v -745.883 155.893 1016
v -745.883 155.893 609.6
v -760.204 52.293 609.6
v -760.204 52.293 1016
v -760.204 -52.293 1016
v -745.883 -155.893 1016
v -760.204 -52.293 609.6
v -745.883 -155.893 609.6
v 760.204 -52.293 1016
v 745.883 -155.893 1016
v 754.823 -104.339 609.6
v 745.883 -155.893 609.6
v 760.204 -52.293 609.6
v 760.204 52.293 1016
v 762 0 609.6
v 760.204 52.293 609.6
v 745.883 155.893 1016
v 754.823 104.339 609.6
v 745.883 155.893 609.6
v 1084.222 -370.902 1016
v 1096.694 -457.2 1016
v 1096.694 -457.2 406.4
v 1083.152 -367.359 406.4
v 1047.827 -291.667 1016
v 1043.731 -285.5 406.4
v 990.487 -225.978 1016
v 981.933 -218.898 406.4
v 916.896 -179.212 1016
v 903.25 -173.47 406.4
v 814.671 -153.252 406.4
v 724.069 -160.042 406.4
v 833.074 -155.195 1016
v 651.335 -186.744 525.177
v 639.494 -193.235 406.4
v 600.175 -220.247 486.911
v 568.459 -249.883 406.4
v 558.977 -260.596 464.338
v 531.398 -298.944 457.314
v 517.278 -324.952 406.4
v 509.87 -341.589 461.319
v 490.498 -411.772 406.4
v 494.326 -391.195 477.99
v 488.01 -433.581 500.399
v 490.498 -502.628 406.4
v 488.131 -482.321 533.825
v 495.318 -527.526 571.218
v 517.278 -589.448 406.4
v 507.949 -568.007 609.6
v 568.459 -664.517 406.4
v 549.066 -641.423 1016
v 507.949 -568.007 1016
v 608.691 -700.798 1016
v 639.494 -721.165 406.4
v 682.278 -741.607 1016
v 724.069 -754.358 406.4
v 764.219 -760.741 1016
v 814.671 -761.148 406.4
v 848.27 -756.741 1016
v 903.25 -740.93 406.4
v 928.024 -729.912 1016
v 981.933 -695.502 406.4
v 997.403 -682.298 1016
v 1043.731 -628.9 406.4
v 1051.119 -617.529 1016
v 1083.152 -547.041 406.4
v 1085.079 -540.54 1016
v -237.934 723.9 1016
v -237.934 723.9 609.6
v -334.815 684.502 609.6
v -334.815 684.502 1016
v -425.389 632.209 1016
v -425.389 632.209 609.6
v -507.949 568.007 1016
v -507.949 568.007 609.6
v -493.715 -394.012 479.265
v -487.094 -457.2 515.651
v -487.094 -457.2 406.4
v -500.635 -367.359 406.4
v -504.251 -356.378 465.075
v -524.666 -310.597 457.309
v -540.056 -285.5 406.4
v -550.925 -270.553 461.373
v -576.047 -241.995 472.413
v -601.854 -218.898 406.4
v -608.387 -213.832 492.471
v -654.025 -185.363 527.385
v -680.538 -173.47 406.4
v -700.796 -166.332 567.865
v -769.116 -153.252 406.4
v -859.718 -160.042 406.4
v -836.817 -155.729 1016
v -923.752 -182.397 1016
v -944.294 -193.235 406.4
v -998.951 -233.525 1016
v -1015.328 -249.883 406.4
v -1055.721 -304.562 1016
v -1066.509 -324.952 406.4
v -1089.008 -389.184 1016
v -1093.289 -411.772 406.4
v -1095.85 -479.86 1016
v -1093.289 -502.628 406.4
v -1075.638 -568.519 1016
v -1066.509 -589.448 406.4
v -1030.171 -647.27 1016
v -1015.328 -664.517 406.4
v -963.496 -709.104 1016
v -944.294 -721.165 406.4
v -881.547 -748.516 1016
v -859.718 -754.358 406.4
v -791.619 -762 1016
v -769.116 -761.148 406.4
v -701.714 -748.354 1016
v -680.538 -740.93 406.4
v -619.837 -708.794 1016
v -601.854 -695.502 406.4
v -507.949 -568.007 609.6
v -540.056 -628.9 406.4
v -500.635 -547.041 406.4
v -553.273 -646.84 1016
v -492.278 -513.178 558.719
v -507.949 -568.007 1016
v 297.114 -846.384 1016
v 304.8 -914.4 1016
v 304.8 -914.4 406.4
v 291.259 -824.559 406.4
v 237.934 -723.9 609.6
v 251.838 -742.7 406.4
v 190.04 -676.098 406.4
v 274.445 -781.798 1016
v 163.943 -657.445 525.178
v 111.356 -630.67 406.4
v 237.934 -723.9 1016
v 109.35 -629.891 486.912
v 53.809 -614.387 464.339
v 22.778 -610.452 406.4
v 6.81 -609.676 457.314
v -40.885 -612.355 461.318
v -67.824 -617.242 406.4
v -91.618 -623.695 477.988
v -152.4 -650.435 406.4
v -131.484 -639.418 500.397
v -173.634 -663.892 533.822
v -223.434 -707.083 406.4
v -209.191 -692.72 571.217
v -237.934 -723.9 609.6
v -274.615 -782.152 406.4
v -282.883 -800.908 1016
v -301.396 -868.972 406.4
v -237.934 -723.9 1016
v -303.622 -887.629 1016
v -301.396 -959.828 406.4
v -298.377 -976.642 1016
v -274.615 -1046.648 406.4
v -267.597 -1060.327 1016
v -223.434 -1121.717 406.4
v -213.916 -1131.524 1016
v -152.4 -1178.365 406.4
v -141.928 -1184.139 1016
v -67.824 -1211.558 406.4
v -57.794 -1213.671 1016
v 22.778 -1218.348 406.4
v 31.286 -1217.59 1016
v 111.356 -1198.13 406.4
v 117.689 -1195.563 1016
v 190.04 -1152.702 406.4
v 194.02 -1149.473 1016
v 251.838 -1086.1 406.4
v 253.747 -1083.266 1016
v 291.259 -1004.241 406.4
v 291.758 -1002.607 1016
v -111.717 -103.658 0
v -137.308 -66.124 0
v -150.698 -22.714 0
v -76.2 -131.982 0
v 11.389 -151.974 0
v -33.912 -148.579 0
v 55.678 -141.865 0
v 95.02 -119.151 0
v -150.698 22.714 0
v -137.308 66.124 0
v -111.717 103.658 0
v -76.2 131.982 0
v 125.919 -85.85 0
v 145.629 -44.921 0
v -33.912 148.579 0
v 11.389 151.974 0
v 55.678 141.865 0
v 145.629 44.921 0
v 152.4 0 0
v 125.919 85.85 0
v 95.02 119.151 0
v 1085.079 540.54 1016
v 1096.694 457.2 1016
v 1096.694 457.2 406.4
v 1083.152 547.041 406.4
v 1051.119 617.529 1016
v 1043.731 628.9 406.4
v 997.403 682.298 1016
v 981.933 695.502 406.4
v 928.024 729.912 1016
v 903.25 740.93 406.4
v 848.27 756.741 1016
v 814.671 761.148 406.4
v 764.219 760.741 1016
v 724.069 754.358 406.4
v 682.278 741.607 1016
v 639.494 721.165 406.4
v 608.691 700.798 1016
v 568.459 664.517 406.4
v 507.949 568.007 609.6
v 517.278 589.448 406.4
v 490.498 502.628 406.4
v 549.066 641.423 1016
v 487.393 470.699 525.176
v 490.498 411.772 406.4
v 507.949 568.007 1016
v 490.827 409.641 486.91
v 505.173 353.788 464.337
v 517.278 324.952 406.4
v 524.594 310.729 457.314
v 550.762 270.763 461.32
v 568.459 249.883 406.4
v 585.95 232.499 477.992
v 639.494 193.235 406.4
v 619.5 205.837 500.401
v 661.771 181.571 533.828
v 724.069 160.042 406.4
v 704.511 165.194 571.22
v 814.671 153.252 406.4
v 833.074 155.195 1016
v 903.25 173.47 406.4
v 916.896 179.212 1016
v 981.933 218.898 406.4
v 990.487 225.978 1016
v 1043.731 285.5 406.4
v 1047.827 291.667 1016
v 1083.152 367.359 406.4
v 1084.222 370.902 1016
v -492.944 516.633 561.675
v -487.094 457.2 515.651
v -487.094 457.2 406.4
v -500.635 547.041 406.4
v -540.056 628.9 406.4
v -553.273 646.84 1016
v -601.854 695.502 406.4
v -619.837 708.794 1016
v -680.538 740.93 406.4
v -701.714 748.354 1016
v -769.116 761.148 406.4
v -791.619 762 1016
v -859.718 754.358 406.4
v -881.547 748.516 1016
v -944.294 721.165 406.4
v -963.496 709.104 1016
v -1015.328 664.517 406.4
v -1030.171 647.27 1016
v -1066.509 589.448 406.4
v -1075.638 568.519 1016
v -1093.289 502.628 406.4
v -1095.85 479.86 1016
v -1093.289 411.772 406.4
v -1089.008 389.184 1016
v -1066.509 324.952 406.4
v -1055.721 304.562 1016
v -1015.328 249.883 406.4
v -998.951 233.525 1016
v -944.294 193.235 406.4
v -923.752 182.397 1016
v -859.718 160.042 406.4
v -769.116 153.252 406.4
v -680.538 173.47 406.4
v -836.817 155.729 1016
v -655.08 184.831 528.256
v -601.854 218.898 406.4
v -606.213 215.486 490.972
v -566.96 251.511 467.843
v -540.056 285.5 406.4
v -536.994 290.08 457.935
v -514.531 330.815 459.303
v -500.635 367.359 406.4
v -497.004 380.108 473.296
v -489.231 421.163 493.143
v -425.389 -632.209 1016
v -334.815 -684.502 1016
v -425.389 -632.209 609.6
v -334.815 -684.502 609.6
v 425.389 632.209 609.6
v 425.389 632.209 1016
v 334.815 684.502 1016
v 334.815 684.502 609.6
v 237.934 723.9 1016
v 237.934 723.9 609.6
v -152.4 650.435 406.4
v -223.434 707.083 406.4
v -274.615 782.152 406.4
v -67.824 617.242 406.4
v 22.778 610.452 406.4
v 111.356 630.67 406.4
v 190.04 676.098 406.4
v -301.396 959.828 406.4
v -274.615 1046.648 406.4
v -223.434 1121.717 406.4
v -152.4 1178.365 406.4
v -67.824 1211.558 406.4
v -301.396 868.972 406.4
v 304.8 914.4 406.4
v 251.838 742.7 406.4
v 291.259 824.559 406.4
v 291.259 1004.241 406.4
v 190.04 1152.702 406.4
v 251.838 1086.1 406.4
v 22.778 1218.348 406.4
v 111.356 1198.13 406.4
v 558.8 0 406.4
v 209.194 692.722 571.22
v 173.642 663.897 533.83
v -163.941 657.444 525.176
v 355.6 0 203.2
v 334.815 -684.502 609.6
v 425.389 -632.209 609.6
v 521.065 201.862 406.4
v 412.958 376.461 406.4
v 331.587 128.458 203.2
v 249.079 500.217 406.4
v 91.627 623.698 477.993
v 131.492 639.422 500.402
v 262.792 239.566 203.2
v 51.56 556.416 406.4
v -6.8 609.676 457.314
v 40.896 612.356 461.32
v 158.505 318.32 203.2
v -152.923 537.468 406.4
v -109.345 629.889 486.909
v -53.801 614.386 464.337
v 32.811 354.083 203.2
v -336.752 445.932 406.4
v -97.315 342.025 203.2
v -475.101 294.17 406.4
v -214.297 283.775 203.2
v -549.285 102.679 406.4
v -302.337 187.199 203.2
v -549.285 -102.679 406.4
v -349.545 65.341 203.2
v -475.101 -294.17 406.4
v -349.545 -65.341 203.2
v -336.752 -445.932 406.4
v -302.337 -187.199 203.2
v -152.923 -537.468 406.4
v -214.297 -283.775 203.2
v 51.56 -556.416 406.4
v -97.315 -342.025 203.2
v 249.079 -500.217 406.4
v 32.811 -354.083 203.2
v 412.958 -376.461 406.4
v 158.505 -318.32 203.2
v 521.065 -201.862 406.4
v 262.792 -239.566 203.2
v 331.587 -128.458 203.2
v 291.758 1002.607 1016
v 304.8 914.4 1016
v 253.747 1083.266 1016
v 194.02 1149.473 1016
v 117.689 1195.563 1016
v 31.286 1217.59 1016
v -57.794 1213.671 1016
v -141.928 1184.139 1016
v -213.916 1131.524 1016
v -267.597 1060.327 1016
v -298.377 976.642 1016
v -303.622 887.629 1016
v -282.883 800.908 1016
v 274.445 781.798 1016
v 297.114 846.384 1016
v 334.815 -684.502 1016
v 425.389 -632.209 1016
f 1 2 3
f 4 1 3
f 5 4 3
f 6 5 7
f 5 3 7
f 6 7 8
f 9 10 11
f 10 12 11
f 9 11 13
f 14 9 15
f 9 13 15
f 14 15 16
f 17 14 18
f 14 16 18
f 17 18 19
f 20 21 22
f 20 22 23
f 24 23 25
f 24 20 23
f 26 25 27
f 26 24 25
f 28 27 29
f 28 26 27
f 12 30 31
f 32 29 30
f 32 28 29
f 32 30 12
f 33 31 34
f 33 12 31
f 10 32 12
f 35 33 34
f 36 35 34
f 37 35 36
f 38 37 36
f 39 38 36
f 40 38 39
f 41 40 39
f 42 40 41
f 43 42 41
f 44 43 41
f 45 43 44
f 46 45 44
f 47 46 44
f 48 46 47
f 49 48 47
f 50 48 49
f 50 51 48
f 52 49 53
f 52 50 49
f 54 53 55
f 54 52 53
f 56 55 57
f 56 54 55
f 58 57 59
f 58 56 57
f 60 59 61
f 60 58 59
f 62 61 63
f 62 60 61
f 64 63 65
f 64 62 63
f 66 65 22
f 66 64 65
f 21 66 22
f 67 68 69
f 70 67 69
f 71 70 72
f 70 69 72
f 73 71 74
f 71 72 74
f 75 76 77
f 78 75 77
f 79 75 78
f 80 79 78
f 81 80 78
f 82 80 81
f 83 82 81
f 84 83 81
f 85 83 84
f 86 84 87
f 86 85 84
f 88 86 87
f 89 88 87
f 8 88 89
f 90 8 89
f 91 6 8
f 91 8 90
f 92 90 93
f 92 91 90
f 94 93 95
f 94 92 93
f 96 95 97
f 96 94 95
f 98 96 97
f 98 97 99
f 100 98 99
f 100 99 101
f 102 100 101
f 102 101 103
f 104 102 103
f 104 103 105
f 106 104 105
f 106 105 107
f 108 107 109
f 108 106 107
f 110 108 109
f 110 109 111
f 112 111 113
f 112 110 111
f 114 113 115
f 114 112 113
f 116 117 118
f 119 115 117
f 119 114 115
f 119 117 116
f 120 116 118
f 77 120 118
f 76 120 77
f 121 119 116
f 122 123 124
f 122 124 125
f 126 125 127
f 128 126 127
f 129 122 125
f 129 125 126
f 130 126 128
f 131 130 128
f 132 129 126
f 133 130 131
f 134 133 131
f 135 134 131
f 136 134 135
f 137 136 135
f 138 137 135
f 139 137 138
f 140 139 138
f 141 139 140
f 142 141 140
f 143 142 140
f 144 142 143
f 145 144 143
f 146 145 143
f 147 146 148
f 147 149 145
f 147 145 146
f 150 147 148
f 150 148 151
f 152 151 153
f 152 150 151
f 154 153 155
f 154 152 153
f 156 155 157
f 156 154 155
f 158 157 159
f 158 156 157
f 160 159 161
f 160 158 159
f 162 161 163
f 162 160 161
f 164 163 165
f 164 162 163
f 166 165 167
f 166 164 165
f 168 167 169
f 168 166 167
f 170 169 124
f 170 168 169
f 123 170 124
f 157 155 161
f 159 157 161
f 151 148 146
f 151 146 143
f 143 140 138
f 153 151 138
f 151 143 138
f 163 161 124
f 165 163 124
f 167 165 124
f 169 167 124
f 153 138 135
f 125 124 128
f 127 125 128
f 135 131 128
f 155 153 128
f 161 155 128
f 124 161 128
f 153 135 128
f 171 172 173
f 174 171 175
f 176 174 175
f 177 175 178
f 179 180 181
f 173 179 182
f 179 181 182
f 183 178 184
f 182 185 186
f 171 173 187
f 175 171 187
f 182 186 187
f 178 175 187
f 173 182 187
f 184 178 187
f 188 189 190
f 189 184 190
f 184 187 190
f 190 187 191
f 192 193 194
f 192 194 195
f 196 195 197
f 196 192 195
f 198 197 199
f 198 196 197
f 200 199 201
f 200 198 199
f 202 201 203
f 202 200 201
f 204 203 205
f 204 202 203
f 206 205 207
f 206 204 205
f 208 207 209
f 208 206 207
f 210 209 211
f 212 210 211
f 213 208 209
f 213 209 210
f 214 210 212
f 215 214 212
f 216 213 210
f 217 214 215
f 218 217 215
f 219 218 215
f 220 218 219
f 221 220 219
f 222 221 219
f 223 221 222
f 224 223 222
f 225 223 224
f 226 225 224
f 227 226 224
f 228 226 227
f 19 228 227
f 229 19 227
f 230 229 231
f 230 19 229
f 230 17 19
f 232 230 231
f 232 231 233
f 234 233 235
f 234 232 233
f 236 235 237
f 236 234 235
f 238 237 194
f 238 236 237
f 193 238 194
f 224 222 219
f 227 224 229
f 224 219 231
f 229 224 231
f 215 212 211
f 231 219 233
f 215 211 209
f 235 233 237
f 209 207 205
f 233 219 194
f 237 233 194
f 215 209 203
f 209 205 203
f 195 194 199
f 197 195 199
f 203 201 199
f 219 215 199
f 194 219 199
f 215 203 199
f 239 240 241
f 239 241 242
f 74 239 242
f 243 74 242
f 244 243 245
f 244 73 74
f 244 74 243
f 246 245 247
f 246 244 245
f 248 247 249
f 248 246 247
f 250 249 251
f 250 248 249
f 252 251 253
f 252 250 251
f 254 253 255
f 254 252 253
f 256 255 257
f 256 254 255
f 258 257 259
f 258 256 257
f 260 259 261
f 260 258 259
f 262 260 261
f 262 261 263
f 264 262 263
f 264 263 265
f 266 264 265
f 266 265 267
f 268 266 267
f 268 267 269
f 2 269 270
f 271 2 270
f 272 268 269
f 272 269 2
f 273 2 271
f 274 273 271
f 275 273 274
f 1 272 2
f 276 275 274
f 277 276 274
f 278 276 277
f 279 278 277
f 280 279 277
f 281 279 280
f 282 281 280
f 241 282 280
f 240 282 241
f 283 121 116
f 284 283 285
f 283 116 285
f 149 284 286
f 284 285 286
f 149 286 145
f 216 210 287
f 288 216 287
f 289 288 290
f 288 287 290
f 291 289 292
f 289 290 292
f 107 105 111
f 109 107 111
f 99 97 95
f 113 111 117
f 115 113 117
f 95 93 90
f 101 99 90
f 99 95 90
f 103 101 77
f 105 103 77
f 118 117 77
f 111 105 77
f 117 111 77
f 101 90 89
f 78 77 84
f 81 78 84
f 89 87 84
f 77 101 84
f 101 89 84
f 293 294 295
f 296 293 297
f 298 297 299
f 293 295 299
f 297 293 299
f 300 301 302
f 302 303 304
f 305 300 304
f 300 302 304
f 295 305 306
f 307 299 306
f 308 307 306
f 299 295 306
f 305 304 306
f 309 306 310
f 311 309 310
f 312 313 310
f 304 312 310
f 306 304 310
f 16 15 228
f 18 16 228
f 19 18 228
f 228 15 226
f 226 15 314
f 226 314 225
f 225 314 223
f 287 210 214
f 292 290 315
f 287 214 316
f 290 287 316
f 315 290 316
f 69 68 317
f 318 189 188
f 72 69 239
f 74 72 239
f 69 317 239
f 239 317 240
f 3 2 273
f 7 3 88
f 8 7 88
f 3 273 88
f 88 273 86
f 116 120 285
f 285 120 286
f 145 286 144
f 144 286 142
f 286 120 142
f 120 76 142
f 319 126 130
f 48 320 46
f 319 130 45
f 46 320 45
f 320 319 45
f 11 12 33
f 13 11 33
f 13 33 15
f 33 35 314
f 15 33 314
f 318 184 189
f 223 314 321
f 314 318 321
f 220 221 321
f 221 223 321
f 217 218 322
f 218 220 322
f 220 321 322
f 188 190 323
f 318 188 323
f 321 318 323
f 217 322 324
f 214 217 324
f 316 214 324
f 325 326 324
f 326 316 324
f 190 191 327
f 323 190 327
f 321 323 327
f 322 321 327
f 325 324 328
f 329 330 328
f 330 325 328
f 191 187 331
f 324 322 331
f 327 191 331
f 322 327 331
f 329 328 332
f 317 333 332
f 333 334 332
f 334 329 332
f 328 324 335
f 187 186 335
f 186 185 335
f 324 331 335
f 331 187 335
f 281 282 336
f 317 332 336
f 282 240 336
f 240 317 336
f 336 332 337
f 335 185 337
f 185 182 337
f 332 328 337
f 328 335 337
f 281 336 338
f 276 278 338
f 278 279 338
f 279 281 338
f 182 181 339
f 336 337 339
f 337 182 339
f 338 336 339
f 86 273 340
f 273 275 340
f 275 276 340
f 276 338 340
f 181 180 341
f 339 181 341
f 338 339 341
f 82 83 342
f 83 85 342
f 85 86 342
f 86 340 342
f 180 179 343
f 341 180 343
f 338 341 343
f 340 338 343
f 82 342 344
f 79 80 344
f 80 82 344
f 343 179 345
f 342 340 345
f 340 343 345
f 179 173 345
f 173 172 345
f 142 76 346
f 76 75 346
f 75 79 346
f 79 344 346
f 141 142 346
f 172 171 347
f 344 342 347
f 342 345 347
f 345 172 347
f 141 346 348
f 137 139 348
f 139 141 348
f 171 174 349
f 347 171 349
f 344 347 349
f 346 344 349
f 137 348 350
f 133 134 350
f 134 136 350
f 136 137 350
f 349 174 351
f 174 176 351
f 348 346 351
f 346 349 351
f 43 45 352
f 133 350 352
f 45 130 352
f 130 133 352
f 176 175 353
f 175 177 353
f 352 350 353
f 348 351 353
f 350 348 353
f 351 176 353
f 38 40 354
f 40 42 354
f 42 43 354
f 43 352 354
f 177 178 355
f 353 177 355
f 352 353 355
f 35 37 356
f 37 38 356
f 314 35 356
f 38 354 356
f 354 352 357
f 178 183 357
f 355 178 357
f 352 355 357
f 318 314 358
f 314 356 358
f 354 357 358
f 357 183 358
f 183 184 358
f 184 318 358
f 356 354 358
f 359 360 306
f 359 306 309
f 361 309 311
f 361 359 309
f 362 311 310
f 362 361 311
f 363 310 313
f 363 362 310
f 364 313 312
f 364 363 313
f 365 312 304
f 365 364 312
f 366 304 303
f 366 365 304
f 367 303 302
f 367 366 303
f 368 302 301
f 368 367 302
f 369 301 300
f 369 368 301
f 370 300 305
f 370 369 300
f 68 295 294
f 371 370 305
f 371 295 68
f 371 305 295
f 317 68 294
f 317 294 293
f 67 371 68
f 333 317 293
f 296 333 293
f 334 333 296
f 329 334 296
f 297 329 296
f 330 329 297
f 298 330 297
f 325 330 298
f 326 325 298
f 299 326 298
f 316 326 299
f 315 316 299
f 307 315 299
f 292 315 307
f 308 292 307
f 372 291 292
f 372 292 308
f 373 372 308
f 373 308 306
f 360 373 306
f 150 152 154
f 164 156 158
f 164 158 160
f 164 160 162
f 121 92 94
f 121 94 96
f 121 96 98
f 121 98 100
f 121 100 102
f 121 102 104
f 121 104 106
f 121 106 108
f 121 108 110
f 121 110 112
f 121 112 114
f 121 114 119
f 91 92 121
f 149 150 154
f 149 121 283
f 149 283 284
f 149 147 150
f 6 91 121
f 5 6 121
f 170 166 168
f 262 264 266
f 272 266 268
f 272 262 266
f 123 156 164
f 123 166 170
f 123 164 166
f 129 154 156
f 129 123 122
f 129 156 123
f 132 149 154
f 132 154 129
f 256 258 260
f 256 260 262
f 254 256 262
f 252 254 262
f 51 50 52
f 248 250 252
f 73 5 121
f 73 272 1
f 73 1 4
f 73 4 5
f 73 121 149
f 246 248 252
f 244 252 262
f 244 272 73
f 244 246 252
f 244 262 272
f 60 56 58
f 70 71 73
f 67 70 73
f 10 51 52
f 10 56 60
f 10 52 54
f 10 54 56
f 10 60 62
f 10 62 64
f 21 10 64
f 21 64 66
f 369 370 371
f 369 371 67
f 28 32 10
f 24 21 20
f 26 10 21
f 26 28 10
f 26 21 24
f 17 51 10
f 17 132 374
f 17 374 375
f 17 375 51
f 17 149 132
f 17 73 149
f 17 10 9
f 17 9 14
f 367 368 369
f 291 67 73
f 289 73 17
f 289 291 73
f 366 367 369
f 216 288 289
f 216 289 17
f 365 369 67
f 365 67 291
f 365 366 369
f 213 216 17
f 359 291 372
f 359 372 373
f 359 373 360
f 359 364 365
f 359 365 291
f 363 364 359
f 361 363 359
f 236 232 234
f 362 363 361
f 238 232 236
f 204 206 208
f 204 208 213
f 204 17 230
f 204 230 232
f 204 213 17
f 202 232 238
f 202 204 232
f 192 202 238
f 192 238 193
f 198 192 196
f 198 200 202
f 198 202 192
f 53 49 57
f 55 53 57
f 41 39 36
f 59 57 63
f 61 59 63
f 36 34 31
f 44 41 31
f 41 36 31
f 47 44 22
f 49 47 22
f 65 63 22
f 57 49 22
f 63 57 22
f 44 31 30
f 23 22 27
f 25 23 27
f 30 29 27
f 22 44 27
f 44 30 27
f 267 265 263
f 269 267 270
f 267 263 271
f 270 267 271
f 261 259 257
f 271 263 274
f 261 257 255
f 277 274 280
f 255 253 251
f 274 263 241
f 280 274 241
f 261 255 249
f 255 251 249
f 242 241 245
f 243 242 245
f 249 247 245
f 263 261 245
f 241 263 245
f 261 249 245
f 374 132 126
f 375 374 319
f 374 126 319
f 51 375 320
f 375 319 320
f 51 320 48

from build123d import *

# Parameters (mm, degrees)
F0_R     = 762
F1_DEPTH = 1016
F2_SIZE  = 609.6
F3_R     = 304.8
F4_DEPTH = 609.6


with BuildPart() as f1:
    # F0 (on Top) → F1 (new body)
    with BuildSketch(Plane.XY):
        Circle(F0_R)
    extrude(amount=F1_DEPTH)

    # F2
    f2_edges = [f1.edges().sort_by_distance(p)[0] for p in [
        (-762, 0, 0),
    ]]
    chamfer(f2_edges, length=F2_SIZE)

    # F3 (on face) → F4 (join)
    with BuildSketch(Plane.XY.offset(1016)):
        with Locations((0, 914.4)):
            Circle(F3_R)
        with Locations((791.893629, 457.2)):
            Circle(F3_R)
        with Locations((791.893629, -457.2)):
            Circle(F3_R)
        with Locations((0, -914.4)):
            Circle(F3_R)
        with Locations((-791.893629, -457.2)):
            Circle(F3_R)
        with Locations((-791.893629, 457.2)):
            Circle(F3_R)
    extrude(amount=-F4_DEPTH)


solid = f1.part
